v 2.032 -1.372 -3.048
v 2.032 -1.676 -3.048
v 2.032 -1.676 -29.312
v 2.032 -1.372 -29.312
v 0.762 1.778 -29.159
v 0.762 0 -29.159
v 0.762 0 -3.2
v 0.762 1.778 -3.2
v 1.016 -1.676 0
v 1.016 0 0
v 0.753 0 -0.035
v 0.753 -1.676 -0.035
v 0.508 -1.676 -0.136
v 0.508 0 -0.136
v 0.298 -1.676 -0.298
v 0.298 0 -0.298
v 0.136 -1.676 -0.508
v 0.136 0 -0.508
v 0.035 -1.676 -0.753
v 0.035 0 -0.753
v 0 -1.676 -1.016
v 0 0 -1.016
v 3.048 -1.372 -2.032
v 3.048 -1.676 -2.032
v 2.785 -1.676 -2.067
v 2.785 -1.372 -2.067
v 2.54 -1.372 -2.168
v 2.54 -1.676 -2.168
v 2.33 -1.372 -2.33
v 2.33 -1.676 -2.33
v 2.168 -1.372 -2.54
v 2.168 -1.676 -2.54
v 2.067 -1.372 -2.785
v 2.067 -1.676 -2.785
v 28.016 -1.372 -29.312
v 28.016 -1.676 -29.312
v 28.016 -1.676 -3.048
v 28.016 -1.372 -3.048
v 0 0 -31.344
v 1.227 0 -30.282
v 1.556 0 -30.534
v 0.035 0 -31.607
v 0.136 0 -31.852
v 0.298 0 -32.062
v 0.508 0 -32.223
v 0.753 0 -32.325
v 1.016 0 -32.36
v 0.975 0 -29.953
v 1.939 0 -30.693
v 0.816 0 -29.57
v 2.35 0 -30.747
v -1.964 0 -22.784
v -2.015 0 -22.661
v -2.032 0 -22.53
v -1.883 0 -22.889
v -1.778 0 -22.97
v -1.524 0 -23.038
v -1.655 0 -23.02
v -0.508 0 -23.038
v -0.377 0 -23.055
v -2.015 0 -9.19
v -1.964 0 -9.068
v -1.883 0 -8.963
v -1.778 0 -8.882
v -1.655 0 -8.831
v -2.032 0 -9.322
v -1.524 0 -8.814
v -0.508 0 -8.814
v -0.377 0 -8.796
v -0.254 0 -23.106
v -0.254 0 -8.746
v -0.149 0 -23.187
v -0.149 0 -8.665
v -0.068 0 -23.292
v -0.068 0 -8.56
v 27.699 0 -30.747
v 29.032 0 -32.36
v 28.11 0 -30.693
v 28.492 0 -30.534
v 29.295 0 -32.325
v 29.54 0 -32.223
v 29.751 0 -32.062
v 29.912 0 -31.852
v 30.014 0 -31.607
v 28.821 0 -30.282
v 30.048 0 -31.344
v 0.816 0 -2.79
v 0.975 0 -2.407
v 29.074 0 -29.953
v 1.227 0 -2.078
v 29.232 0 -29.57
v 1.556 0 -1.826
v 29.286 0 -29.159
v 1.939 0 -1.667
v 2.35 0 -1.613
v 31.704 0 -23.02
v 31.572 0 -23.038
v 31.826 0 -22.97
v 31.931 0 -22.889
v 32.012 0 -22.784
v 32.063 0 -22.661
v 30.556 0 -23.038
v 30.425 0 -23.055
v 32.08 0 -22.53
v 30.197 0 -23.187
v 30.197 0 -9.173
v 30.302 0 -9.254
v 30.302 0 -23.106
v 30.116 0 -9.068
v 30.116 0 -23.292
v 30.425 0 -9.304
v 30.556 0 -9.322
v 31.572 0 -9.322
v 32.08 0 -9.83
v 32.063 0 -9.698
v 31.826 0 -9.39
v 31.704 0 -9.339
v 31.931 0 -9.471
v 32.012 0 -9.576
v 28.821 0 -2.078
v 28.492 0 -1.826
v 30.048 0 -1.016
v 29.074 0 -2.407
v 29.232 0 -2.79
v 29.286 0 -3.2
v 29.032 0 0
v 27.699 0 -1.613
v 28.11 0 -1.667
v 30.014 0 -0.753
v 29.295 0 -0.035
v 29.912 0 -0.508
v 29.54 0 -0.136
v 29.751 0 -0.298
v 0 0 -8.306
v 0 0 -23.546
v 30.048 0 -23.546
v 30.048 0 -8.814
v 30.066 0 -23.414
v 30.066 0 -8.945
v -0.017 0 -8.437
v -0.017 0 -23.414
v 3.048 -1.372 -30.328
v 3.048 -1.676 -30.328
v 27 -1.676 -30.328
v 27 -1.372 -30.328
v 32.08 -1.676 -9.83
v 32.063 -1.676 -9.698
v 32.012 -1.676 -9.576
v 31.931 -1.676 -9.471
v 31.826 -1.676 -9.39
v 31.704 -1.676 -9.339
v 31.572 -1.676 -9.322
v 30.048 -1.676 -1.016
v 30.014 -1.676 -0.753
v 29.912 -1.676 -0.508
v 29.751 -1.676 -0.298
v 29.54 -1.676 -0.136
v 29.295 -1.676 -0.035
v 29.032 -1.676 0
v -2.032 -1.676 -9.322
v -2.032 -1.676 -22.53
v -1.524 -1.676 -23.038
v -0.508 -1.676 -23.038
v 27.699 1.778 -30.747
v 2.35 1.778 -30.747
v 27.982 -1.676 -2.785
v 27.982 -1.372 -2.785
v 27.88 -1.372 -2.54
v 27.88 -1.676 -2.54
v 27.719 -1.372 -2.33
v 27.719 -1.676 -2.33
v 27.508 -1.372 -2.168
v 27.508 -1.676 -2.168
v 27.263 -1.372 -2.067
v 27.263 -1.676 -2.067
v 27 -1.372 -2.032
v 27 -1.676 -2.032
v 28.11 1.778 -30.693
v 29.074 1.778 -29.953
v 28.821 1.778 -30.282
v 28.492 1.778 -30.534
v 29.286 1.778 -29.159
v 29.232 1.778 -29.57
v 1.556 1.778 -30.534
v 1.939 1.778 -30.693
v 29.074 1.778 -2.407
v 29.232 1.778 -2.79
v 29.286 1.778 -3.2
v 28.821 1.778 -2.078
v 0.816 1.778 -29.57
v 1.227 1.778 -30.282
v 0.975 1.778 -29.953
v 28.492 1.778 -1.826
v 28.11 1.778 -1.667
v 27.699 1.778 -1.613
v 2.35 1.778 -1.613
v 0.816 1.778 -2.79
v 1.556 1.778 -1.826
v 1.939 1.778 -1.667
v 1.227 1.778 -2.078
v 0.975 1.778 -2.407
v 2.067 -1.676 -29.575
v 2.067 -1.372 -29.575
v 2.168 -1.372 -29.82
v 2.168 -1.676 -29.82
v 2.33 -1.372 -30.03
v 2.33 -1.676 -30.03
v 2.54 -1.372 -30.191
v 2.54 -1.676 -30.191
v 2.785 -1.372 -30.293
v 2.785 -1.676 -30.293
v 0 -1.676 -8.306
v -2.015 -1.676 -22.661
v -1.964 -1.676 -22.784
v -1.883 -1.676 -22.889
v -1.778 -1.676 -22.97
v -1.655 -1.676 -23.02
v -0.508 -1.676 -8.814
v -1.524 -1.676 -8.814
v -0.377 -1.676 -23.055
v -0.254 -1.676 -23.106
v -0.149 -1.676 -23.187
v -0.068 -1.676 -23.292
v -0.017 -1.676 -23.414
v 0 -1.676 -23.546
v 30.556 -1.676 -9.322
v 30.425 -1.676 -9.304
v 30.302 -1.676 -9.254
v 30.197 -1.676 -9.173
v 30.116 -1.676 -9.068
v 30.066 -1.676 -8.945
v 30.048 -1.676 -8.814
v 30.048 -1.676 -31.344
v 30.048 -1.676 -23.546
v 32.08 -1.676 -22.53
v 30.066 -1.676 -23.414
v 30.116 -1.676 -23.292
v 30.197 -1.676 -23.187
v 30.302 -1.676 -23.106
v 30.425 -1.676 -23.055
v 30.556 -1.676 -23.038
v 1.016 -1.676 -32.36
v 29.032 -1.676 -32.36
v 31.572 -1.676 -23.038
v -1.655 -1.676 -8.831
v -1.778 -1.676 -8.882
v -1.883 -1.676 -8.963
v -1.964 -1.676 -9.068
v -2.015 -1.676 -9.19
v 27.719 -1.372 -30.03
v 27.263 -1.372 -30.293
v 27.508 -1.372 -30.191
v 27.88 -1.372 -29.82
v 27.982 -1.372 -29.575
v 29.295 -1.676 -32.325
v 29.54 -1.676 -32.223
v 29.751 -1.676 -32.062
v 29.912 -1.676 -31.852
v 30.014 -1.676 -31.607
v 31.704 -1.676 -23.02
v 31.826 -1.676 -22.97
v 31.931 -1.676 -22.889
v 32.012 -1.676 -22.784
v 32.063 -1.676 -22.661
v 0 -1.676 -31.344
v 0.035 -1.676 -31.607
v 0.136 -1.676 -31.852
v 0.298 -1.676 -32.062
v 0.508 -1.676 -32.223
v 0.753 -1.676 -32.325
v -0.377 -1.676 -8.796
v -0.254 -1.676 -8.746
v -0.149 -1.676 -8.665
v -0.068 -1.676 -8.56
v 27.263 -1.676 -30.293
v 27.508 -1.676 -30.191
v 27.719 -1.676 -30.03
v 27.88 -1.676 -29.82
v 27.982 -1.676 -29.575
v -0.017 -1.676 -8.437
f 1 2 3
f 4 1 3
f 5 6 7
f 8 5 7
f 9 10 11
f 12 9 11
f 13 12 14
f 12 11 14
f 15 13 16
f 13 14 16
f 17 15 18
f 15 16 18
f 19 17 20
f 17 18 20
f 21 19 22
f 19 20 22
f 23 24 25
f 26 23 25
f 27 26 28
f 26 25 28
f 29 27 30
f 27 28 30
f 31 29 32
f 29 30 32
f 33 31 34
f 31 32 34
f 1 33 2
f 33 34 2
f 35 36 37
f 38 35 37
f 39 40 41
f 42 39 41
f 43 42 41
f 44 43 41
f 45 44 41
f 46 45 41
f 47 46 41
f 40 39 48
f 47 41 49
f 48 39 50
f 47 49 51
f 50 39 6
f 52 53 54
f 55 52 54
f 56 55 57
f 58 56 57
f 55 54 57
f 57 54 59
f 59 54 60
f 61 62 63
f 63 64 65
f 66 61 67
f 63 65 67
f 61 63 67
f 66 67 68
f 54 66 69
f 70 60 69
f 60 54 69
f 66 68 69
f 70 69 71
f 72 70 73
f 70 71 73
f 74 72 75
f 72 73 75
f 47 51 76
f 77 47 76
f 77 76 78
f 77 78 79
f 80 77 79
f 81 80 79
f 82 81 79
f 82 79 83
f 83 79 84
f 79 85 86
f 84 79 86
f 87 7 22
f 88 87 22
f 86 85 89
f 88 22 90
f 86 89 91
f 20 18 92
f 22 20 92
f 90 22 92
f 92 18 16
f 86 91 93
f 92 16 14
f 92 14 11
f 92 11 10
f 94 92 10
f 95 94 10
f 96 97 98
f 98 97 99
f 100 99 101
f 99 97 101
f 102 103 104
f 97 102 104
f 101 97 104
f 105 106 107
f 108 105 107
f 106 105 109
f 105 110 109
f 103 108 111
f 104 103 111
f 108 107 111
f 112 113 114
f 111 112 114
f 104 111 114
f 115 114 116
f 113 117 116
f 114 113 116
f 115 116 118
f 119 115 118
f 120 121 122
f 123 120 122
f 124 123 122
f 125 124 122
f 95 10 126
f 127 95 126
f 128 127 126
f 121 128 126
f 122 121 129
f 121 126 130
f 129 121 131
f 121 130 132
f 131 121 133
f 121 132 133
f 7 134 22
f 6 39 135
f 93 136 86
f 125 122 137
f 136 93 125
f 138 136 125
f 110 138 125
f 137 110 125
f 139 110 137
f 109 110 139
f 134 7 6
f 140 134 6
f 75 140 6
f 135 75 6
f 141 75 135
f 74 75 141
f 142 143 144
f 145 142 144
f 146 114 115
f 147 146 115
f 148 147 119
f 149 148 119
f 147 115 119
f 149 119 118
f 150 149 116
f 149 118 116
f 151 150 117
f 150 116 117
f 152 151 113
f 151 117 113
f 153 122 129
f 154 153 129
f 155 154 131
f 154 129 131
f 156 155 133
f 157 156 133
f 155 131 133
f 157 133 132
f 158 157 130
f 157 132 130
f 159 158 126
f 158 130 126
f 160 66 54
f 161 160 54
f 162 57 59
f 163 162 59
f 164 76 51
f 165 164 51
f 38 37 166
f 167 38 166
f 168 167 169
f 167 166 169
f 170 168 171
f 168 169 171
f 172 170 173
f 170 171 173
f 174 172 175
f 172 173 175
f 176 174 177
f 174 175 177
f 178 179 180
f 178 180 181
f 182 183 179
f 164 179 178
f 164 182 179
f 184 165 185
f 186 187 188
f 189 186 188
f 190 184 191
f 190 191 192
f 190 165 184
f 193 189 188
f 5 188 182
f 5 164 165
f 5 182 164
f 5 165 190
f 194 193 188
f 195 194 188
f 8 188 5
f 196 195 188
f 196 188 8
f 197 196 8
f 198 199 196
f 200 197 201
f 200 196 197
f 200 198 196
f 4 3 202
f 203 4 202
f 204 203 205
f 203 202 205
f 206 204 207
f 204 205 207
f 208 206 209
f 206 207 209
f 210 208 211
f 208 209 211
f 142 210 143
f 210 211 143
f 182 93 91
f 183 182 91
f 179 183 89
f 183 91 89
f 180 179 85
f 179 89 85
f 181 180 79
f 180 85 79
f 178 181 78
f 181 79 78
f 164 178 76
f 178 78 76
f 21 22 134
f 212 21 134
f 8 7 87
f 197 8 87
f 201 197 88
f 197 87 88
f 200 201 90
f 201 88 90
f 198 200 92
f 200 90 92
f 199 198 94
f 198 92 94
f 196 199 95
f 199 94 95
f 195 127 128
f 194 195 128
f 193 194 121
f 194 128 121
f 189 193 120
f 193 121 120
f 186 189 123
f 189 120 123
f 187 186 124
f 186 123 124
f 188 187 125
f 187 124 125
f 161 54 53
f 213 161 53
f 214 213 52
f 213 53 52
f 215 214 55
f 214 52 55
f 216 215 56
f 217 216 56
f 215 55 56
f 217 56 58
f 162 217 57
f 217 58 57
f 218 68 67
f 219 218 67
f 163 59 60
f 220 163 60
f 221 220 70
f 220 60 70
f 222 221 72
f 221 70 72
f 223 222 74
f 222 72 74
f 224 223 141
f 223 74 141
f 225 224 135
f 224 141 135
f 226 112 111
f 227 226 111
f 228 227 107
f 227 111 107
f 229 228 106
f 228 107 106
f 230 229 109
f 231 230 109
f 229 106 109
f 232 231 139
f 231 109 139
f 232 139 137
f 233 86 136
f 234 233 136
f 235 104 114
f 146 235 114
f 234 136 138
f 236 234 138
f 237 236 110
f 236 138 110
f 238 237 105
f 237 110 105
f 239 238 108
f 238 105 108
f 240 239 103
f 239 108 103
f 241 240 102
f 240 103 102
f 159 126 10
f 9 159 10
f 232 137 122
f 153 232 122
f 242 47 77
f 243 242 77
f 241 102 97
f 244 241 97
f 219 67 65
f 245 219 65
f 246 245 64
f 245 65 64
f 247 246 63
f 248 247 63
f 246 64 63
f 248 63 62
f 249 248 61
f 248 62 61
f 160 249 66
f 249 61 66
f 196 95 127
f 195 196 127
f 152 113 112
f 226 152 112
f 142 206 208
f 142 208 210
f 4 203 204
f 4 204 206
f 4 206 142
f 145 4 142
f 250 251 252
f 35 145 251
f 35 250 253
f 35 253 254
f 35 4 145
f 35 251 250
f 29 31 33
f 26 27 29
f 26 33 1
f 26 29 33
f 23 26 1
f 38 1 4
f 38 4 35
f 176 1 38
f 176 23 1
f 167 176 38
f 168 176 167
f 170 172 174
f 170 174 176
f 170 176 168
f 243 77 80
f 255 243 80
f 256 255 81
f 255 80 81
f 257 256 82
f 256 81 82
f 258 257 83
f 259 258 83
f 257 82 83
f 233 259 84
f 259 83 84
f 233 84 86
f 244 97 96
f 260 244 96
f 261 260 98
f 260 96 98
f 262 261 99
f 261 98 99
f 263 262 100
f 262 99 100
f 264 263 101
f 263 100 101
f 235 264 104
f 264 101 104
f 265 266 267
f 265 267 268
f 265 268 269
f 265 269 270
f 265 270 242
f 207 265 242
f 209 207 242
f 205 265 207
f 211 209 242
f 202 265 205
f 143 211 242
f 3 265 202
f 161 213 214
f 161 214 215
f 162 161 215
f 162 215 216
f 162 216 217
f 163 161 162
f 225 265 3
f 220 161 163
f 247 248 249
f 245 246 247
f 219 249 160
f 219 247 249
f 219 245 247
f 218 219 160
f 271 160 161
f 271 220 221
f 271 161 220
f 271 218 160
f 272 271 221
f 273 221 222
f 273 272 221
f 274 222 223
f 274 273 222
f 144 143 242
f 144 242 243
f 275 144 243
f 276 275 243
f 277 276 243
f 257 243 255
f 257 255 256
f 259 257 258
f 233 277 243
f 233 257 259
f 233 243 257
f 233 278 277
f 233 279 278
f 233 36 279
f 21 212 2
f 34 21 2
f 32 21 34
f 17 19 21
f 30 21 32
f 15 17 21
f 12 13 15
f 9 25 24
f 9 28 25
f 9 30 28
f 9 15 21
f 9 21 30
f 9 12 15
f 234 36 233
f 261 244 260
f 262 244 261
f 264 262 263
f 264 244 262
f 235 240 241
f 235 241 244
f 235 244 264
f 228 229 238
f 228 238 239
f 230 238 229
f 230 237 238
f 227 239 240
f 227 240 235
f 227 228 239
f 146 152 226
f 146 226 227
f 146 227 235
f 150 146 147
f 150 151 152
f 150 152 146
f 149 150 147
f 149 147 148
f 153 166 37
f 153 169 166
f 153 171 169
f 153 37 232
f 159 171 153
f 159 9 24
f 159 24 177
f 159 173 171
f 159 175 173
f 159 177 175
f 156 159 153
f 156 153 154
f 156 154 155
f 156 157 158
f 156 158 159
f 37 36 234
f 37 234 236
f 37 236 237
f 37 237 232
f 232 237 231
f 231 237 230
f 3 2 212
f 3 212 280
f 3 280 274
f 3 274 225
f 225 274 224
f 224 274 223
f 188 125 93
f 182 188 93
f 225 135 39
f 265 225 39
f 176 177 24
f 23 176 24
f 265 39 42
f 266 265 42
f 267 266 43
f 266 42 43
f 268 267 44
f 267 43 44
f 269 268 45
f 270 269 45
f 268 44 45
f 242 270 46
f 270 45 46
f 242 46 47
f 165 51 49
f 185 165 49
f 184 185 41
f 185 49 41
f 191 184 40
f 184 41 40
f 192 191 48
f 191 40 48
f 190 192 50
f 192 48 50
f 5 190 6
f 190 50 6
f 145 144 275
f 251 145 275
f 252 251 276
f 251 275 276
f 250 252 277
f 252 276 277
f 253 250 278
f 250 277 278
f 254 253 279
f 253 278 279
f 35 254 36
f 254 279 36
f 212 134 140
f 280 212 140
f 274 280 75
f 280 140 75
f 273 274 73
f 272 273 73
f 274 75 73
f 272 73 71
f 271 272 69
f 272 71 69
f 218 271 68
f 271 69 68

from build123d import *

# Parameters (mm, degrees)
F1_DEPTH = 1.6764
F3_DEPTH = 0.3048
F5_DEPTH = 1.778


with BuildPart() as f1:
    # F0 (on Front) → F1 (new body)
    with BuildSketch(Plane.XZ):
        with BuildLine():
            Line((29.0322, 0), (1.016, 0))
            ThreePointArc((1.016, 0), (0.29758, -0.29758), (0, -1.016))
            Line((0, -1.016), (0, -8.3058))
            ThreePointArc((0, -8.3058), (-0.14879, -8.66501), (-0.508, -8.8138))
            Line((-0.508, -8.8138), (-1.524, -8.8138))
            ThreePointArc((-1.524, -8.8138), (-1.88321, -8.96259), (-2.032, -9.3218))
            Line((-2.032, -9.3218), (-2.032, -22.5298))
            ThreePointArc((-2.032, -22.5298), (-1.88321, -22.88901), (-1.524, -23.0378))
            Line((-1.524, -23.0378), (-0.508, -23.0378))
            ThreePointArc((-0.508, -23.0378), (-0.14879, -23.18659), (0, -23.5458))
            Line((0, -23.5458), (0, -31.3436))
            ThreePointArc((0, -31.3436), (0.29758, -32.06202), (1.016, -32.3596))
            Line((1.016, -32.3596), (29.0322, -32.3596))
            ThreePointArc((29.0322, -32.3596), (29.75062, -32.06202), (30.0482, -31.3436))
            Line((30.0482, -31.3436), (30.0482, -23.5458))
            ThreePointArc((30.0482, -23.5458), (30.19699, -23.18659), (30.5562, -23.0378))
            Line((30.5562, -23.0378), (31.5722, -23.0378))
            ThreePointArc((31.5722, -23.0378), (31.93141, -22.88901), (32.0802, -22.5298))
            Line((32.0802, -22.5298), (32.0802, -9.8298))
            ThreePointArc((32.0802, -9.8298), (31.93141, -9.47059), (31.5722, -9.3218))
            Line((31.5722, -9.3218), (30.5562, -9.3218))
            ThreePointArc((30.5562, -9.3218), (30.19699, -9.17301), (30.0482, -8.8138))
            Line((30.0482, -8.8138), (30.0482, -1.016))
            ThreePointArc((30.0482, -1.016), (29.75062, -0.29758), (29.0322, 0))
        make_face()
    extrude(amount=F1_DEPTH)

    # F2 (on face) → F3 (cut)
    with BuildSketch(Plane.XZ.offset(1.6764)):
        with BuildLine():
            Line((27.0002, -2.032), (3.048, -2.032))
            ThreePointArc((3.048, -2.032), (2.32958, -2.32958), (2.032, -3.048))
            Line((2.032, -3.048), (2.032, -29.3116))
            ThreePointArc((2.032, -29.3116), (2.32958, -30.03002), (3.048, -30.3276))
            Line((3.048, -30.3276), (27.0002, -30.3276))
            ThreePointArc((27.0002, -30.3276), (27.71862, -30.03002), (28.0162, -29.3116))
            Line((28.0162, -29.3116), (28.0162, -3.048))
            ThreePointArc((28.0162, -3.048), (27.71862, -2.32958), (27.0002, -2.032))
        make_face()
    extrude(amount=-F3_DEPTH, mode=Mode.SUBTRACT)

    # F4 (on face) → F5 (join)
    with BuildSketch(Plane(origin=(0, 0, 0), x_dir=(-1, 0, 0), z_dir=(0, 1, 0))):
        with BuildLine():
            Line((-2.3495, -1.6129), (-27.6987, -1.6129))
            ThreePointArc((-27.6987, -1.6129), (-28.821232, -2.077868), (-29.2862, -3.2004))
            Line((-29.2862, -3.2004), (-29.2862, -29.1592))
            ThreePointArc((-29.2862, -29.1592), (-28.821232, -30.281732), (-27.6987, -30.7467))
            Line((-27.6987, -30.7467), (-2.3495, -30.7467))
            ThreePointArc((-2.3495, -30.7467), (-1.226968, -30.281732), (-0.762, -29.1592))
            Line((-0.762, -29.1592), (-0.762, -3.2004))
            ThreePointArc((-0.762, -3.2004), (-1.226968, -2.077868), (-2.3495, -1.6129))
        make_face()
    extrude(amount=F5_DEPTH)


solid = f1.part
